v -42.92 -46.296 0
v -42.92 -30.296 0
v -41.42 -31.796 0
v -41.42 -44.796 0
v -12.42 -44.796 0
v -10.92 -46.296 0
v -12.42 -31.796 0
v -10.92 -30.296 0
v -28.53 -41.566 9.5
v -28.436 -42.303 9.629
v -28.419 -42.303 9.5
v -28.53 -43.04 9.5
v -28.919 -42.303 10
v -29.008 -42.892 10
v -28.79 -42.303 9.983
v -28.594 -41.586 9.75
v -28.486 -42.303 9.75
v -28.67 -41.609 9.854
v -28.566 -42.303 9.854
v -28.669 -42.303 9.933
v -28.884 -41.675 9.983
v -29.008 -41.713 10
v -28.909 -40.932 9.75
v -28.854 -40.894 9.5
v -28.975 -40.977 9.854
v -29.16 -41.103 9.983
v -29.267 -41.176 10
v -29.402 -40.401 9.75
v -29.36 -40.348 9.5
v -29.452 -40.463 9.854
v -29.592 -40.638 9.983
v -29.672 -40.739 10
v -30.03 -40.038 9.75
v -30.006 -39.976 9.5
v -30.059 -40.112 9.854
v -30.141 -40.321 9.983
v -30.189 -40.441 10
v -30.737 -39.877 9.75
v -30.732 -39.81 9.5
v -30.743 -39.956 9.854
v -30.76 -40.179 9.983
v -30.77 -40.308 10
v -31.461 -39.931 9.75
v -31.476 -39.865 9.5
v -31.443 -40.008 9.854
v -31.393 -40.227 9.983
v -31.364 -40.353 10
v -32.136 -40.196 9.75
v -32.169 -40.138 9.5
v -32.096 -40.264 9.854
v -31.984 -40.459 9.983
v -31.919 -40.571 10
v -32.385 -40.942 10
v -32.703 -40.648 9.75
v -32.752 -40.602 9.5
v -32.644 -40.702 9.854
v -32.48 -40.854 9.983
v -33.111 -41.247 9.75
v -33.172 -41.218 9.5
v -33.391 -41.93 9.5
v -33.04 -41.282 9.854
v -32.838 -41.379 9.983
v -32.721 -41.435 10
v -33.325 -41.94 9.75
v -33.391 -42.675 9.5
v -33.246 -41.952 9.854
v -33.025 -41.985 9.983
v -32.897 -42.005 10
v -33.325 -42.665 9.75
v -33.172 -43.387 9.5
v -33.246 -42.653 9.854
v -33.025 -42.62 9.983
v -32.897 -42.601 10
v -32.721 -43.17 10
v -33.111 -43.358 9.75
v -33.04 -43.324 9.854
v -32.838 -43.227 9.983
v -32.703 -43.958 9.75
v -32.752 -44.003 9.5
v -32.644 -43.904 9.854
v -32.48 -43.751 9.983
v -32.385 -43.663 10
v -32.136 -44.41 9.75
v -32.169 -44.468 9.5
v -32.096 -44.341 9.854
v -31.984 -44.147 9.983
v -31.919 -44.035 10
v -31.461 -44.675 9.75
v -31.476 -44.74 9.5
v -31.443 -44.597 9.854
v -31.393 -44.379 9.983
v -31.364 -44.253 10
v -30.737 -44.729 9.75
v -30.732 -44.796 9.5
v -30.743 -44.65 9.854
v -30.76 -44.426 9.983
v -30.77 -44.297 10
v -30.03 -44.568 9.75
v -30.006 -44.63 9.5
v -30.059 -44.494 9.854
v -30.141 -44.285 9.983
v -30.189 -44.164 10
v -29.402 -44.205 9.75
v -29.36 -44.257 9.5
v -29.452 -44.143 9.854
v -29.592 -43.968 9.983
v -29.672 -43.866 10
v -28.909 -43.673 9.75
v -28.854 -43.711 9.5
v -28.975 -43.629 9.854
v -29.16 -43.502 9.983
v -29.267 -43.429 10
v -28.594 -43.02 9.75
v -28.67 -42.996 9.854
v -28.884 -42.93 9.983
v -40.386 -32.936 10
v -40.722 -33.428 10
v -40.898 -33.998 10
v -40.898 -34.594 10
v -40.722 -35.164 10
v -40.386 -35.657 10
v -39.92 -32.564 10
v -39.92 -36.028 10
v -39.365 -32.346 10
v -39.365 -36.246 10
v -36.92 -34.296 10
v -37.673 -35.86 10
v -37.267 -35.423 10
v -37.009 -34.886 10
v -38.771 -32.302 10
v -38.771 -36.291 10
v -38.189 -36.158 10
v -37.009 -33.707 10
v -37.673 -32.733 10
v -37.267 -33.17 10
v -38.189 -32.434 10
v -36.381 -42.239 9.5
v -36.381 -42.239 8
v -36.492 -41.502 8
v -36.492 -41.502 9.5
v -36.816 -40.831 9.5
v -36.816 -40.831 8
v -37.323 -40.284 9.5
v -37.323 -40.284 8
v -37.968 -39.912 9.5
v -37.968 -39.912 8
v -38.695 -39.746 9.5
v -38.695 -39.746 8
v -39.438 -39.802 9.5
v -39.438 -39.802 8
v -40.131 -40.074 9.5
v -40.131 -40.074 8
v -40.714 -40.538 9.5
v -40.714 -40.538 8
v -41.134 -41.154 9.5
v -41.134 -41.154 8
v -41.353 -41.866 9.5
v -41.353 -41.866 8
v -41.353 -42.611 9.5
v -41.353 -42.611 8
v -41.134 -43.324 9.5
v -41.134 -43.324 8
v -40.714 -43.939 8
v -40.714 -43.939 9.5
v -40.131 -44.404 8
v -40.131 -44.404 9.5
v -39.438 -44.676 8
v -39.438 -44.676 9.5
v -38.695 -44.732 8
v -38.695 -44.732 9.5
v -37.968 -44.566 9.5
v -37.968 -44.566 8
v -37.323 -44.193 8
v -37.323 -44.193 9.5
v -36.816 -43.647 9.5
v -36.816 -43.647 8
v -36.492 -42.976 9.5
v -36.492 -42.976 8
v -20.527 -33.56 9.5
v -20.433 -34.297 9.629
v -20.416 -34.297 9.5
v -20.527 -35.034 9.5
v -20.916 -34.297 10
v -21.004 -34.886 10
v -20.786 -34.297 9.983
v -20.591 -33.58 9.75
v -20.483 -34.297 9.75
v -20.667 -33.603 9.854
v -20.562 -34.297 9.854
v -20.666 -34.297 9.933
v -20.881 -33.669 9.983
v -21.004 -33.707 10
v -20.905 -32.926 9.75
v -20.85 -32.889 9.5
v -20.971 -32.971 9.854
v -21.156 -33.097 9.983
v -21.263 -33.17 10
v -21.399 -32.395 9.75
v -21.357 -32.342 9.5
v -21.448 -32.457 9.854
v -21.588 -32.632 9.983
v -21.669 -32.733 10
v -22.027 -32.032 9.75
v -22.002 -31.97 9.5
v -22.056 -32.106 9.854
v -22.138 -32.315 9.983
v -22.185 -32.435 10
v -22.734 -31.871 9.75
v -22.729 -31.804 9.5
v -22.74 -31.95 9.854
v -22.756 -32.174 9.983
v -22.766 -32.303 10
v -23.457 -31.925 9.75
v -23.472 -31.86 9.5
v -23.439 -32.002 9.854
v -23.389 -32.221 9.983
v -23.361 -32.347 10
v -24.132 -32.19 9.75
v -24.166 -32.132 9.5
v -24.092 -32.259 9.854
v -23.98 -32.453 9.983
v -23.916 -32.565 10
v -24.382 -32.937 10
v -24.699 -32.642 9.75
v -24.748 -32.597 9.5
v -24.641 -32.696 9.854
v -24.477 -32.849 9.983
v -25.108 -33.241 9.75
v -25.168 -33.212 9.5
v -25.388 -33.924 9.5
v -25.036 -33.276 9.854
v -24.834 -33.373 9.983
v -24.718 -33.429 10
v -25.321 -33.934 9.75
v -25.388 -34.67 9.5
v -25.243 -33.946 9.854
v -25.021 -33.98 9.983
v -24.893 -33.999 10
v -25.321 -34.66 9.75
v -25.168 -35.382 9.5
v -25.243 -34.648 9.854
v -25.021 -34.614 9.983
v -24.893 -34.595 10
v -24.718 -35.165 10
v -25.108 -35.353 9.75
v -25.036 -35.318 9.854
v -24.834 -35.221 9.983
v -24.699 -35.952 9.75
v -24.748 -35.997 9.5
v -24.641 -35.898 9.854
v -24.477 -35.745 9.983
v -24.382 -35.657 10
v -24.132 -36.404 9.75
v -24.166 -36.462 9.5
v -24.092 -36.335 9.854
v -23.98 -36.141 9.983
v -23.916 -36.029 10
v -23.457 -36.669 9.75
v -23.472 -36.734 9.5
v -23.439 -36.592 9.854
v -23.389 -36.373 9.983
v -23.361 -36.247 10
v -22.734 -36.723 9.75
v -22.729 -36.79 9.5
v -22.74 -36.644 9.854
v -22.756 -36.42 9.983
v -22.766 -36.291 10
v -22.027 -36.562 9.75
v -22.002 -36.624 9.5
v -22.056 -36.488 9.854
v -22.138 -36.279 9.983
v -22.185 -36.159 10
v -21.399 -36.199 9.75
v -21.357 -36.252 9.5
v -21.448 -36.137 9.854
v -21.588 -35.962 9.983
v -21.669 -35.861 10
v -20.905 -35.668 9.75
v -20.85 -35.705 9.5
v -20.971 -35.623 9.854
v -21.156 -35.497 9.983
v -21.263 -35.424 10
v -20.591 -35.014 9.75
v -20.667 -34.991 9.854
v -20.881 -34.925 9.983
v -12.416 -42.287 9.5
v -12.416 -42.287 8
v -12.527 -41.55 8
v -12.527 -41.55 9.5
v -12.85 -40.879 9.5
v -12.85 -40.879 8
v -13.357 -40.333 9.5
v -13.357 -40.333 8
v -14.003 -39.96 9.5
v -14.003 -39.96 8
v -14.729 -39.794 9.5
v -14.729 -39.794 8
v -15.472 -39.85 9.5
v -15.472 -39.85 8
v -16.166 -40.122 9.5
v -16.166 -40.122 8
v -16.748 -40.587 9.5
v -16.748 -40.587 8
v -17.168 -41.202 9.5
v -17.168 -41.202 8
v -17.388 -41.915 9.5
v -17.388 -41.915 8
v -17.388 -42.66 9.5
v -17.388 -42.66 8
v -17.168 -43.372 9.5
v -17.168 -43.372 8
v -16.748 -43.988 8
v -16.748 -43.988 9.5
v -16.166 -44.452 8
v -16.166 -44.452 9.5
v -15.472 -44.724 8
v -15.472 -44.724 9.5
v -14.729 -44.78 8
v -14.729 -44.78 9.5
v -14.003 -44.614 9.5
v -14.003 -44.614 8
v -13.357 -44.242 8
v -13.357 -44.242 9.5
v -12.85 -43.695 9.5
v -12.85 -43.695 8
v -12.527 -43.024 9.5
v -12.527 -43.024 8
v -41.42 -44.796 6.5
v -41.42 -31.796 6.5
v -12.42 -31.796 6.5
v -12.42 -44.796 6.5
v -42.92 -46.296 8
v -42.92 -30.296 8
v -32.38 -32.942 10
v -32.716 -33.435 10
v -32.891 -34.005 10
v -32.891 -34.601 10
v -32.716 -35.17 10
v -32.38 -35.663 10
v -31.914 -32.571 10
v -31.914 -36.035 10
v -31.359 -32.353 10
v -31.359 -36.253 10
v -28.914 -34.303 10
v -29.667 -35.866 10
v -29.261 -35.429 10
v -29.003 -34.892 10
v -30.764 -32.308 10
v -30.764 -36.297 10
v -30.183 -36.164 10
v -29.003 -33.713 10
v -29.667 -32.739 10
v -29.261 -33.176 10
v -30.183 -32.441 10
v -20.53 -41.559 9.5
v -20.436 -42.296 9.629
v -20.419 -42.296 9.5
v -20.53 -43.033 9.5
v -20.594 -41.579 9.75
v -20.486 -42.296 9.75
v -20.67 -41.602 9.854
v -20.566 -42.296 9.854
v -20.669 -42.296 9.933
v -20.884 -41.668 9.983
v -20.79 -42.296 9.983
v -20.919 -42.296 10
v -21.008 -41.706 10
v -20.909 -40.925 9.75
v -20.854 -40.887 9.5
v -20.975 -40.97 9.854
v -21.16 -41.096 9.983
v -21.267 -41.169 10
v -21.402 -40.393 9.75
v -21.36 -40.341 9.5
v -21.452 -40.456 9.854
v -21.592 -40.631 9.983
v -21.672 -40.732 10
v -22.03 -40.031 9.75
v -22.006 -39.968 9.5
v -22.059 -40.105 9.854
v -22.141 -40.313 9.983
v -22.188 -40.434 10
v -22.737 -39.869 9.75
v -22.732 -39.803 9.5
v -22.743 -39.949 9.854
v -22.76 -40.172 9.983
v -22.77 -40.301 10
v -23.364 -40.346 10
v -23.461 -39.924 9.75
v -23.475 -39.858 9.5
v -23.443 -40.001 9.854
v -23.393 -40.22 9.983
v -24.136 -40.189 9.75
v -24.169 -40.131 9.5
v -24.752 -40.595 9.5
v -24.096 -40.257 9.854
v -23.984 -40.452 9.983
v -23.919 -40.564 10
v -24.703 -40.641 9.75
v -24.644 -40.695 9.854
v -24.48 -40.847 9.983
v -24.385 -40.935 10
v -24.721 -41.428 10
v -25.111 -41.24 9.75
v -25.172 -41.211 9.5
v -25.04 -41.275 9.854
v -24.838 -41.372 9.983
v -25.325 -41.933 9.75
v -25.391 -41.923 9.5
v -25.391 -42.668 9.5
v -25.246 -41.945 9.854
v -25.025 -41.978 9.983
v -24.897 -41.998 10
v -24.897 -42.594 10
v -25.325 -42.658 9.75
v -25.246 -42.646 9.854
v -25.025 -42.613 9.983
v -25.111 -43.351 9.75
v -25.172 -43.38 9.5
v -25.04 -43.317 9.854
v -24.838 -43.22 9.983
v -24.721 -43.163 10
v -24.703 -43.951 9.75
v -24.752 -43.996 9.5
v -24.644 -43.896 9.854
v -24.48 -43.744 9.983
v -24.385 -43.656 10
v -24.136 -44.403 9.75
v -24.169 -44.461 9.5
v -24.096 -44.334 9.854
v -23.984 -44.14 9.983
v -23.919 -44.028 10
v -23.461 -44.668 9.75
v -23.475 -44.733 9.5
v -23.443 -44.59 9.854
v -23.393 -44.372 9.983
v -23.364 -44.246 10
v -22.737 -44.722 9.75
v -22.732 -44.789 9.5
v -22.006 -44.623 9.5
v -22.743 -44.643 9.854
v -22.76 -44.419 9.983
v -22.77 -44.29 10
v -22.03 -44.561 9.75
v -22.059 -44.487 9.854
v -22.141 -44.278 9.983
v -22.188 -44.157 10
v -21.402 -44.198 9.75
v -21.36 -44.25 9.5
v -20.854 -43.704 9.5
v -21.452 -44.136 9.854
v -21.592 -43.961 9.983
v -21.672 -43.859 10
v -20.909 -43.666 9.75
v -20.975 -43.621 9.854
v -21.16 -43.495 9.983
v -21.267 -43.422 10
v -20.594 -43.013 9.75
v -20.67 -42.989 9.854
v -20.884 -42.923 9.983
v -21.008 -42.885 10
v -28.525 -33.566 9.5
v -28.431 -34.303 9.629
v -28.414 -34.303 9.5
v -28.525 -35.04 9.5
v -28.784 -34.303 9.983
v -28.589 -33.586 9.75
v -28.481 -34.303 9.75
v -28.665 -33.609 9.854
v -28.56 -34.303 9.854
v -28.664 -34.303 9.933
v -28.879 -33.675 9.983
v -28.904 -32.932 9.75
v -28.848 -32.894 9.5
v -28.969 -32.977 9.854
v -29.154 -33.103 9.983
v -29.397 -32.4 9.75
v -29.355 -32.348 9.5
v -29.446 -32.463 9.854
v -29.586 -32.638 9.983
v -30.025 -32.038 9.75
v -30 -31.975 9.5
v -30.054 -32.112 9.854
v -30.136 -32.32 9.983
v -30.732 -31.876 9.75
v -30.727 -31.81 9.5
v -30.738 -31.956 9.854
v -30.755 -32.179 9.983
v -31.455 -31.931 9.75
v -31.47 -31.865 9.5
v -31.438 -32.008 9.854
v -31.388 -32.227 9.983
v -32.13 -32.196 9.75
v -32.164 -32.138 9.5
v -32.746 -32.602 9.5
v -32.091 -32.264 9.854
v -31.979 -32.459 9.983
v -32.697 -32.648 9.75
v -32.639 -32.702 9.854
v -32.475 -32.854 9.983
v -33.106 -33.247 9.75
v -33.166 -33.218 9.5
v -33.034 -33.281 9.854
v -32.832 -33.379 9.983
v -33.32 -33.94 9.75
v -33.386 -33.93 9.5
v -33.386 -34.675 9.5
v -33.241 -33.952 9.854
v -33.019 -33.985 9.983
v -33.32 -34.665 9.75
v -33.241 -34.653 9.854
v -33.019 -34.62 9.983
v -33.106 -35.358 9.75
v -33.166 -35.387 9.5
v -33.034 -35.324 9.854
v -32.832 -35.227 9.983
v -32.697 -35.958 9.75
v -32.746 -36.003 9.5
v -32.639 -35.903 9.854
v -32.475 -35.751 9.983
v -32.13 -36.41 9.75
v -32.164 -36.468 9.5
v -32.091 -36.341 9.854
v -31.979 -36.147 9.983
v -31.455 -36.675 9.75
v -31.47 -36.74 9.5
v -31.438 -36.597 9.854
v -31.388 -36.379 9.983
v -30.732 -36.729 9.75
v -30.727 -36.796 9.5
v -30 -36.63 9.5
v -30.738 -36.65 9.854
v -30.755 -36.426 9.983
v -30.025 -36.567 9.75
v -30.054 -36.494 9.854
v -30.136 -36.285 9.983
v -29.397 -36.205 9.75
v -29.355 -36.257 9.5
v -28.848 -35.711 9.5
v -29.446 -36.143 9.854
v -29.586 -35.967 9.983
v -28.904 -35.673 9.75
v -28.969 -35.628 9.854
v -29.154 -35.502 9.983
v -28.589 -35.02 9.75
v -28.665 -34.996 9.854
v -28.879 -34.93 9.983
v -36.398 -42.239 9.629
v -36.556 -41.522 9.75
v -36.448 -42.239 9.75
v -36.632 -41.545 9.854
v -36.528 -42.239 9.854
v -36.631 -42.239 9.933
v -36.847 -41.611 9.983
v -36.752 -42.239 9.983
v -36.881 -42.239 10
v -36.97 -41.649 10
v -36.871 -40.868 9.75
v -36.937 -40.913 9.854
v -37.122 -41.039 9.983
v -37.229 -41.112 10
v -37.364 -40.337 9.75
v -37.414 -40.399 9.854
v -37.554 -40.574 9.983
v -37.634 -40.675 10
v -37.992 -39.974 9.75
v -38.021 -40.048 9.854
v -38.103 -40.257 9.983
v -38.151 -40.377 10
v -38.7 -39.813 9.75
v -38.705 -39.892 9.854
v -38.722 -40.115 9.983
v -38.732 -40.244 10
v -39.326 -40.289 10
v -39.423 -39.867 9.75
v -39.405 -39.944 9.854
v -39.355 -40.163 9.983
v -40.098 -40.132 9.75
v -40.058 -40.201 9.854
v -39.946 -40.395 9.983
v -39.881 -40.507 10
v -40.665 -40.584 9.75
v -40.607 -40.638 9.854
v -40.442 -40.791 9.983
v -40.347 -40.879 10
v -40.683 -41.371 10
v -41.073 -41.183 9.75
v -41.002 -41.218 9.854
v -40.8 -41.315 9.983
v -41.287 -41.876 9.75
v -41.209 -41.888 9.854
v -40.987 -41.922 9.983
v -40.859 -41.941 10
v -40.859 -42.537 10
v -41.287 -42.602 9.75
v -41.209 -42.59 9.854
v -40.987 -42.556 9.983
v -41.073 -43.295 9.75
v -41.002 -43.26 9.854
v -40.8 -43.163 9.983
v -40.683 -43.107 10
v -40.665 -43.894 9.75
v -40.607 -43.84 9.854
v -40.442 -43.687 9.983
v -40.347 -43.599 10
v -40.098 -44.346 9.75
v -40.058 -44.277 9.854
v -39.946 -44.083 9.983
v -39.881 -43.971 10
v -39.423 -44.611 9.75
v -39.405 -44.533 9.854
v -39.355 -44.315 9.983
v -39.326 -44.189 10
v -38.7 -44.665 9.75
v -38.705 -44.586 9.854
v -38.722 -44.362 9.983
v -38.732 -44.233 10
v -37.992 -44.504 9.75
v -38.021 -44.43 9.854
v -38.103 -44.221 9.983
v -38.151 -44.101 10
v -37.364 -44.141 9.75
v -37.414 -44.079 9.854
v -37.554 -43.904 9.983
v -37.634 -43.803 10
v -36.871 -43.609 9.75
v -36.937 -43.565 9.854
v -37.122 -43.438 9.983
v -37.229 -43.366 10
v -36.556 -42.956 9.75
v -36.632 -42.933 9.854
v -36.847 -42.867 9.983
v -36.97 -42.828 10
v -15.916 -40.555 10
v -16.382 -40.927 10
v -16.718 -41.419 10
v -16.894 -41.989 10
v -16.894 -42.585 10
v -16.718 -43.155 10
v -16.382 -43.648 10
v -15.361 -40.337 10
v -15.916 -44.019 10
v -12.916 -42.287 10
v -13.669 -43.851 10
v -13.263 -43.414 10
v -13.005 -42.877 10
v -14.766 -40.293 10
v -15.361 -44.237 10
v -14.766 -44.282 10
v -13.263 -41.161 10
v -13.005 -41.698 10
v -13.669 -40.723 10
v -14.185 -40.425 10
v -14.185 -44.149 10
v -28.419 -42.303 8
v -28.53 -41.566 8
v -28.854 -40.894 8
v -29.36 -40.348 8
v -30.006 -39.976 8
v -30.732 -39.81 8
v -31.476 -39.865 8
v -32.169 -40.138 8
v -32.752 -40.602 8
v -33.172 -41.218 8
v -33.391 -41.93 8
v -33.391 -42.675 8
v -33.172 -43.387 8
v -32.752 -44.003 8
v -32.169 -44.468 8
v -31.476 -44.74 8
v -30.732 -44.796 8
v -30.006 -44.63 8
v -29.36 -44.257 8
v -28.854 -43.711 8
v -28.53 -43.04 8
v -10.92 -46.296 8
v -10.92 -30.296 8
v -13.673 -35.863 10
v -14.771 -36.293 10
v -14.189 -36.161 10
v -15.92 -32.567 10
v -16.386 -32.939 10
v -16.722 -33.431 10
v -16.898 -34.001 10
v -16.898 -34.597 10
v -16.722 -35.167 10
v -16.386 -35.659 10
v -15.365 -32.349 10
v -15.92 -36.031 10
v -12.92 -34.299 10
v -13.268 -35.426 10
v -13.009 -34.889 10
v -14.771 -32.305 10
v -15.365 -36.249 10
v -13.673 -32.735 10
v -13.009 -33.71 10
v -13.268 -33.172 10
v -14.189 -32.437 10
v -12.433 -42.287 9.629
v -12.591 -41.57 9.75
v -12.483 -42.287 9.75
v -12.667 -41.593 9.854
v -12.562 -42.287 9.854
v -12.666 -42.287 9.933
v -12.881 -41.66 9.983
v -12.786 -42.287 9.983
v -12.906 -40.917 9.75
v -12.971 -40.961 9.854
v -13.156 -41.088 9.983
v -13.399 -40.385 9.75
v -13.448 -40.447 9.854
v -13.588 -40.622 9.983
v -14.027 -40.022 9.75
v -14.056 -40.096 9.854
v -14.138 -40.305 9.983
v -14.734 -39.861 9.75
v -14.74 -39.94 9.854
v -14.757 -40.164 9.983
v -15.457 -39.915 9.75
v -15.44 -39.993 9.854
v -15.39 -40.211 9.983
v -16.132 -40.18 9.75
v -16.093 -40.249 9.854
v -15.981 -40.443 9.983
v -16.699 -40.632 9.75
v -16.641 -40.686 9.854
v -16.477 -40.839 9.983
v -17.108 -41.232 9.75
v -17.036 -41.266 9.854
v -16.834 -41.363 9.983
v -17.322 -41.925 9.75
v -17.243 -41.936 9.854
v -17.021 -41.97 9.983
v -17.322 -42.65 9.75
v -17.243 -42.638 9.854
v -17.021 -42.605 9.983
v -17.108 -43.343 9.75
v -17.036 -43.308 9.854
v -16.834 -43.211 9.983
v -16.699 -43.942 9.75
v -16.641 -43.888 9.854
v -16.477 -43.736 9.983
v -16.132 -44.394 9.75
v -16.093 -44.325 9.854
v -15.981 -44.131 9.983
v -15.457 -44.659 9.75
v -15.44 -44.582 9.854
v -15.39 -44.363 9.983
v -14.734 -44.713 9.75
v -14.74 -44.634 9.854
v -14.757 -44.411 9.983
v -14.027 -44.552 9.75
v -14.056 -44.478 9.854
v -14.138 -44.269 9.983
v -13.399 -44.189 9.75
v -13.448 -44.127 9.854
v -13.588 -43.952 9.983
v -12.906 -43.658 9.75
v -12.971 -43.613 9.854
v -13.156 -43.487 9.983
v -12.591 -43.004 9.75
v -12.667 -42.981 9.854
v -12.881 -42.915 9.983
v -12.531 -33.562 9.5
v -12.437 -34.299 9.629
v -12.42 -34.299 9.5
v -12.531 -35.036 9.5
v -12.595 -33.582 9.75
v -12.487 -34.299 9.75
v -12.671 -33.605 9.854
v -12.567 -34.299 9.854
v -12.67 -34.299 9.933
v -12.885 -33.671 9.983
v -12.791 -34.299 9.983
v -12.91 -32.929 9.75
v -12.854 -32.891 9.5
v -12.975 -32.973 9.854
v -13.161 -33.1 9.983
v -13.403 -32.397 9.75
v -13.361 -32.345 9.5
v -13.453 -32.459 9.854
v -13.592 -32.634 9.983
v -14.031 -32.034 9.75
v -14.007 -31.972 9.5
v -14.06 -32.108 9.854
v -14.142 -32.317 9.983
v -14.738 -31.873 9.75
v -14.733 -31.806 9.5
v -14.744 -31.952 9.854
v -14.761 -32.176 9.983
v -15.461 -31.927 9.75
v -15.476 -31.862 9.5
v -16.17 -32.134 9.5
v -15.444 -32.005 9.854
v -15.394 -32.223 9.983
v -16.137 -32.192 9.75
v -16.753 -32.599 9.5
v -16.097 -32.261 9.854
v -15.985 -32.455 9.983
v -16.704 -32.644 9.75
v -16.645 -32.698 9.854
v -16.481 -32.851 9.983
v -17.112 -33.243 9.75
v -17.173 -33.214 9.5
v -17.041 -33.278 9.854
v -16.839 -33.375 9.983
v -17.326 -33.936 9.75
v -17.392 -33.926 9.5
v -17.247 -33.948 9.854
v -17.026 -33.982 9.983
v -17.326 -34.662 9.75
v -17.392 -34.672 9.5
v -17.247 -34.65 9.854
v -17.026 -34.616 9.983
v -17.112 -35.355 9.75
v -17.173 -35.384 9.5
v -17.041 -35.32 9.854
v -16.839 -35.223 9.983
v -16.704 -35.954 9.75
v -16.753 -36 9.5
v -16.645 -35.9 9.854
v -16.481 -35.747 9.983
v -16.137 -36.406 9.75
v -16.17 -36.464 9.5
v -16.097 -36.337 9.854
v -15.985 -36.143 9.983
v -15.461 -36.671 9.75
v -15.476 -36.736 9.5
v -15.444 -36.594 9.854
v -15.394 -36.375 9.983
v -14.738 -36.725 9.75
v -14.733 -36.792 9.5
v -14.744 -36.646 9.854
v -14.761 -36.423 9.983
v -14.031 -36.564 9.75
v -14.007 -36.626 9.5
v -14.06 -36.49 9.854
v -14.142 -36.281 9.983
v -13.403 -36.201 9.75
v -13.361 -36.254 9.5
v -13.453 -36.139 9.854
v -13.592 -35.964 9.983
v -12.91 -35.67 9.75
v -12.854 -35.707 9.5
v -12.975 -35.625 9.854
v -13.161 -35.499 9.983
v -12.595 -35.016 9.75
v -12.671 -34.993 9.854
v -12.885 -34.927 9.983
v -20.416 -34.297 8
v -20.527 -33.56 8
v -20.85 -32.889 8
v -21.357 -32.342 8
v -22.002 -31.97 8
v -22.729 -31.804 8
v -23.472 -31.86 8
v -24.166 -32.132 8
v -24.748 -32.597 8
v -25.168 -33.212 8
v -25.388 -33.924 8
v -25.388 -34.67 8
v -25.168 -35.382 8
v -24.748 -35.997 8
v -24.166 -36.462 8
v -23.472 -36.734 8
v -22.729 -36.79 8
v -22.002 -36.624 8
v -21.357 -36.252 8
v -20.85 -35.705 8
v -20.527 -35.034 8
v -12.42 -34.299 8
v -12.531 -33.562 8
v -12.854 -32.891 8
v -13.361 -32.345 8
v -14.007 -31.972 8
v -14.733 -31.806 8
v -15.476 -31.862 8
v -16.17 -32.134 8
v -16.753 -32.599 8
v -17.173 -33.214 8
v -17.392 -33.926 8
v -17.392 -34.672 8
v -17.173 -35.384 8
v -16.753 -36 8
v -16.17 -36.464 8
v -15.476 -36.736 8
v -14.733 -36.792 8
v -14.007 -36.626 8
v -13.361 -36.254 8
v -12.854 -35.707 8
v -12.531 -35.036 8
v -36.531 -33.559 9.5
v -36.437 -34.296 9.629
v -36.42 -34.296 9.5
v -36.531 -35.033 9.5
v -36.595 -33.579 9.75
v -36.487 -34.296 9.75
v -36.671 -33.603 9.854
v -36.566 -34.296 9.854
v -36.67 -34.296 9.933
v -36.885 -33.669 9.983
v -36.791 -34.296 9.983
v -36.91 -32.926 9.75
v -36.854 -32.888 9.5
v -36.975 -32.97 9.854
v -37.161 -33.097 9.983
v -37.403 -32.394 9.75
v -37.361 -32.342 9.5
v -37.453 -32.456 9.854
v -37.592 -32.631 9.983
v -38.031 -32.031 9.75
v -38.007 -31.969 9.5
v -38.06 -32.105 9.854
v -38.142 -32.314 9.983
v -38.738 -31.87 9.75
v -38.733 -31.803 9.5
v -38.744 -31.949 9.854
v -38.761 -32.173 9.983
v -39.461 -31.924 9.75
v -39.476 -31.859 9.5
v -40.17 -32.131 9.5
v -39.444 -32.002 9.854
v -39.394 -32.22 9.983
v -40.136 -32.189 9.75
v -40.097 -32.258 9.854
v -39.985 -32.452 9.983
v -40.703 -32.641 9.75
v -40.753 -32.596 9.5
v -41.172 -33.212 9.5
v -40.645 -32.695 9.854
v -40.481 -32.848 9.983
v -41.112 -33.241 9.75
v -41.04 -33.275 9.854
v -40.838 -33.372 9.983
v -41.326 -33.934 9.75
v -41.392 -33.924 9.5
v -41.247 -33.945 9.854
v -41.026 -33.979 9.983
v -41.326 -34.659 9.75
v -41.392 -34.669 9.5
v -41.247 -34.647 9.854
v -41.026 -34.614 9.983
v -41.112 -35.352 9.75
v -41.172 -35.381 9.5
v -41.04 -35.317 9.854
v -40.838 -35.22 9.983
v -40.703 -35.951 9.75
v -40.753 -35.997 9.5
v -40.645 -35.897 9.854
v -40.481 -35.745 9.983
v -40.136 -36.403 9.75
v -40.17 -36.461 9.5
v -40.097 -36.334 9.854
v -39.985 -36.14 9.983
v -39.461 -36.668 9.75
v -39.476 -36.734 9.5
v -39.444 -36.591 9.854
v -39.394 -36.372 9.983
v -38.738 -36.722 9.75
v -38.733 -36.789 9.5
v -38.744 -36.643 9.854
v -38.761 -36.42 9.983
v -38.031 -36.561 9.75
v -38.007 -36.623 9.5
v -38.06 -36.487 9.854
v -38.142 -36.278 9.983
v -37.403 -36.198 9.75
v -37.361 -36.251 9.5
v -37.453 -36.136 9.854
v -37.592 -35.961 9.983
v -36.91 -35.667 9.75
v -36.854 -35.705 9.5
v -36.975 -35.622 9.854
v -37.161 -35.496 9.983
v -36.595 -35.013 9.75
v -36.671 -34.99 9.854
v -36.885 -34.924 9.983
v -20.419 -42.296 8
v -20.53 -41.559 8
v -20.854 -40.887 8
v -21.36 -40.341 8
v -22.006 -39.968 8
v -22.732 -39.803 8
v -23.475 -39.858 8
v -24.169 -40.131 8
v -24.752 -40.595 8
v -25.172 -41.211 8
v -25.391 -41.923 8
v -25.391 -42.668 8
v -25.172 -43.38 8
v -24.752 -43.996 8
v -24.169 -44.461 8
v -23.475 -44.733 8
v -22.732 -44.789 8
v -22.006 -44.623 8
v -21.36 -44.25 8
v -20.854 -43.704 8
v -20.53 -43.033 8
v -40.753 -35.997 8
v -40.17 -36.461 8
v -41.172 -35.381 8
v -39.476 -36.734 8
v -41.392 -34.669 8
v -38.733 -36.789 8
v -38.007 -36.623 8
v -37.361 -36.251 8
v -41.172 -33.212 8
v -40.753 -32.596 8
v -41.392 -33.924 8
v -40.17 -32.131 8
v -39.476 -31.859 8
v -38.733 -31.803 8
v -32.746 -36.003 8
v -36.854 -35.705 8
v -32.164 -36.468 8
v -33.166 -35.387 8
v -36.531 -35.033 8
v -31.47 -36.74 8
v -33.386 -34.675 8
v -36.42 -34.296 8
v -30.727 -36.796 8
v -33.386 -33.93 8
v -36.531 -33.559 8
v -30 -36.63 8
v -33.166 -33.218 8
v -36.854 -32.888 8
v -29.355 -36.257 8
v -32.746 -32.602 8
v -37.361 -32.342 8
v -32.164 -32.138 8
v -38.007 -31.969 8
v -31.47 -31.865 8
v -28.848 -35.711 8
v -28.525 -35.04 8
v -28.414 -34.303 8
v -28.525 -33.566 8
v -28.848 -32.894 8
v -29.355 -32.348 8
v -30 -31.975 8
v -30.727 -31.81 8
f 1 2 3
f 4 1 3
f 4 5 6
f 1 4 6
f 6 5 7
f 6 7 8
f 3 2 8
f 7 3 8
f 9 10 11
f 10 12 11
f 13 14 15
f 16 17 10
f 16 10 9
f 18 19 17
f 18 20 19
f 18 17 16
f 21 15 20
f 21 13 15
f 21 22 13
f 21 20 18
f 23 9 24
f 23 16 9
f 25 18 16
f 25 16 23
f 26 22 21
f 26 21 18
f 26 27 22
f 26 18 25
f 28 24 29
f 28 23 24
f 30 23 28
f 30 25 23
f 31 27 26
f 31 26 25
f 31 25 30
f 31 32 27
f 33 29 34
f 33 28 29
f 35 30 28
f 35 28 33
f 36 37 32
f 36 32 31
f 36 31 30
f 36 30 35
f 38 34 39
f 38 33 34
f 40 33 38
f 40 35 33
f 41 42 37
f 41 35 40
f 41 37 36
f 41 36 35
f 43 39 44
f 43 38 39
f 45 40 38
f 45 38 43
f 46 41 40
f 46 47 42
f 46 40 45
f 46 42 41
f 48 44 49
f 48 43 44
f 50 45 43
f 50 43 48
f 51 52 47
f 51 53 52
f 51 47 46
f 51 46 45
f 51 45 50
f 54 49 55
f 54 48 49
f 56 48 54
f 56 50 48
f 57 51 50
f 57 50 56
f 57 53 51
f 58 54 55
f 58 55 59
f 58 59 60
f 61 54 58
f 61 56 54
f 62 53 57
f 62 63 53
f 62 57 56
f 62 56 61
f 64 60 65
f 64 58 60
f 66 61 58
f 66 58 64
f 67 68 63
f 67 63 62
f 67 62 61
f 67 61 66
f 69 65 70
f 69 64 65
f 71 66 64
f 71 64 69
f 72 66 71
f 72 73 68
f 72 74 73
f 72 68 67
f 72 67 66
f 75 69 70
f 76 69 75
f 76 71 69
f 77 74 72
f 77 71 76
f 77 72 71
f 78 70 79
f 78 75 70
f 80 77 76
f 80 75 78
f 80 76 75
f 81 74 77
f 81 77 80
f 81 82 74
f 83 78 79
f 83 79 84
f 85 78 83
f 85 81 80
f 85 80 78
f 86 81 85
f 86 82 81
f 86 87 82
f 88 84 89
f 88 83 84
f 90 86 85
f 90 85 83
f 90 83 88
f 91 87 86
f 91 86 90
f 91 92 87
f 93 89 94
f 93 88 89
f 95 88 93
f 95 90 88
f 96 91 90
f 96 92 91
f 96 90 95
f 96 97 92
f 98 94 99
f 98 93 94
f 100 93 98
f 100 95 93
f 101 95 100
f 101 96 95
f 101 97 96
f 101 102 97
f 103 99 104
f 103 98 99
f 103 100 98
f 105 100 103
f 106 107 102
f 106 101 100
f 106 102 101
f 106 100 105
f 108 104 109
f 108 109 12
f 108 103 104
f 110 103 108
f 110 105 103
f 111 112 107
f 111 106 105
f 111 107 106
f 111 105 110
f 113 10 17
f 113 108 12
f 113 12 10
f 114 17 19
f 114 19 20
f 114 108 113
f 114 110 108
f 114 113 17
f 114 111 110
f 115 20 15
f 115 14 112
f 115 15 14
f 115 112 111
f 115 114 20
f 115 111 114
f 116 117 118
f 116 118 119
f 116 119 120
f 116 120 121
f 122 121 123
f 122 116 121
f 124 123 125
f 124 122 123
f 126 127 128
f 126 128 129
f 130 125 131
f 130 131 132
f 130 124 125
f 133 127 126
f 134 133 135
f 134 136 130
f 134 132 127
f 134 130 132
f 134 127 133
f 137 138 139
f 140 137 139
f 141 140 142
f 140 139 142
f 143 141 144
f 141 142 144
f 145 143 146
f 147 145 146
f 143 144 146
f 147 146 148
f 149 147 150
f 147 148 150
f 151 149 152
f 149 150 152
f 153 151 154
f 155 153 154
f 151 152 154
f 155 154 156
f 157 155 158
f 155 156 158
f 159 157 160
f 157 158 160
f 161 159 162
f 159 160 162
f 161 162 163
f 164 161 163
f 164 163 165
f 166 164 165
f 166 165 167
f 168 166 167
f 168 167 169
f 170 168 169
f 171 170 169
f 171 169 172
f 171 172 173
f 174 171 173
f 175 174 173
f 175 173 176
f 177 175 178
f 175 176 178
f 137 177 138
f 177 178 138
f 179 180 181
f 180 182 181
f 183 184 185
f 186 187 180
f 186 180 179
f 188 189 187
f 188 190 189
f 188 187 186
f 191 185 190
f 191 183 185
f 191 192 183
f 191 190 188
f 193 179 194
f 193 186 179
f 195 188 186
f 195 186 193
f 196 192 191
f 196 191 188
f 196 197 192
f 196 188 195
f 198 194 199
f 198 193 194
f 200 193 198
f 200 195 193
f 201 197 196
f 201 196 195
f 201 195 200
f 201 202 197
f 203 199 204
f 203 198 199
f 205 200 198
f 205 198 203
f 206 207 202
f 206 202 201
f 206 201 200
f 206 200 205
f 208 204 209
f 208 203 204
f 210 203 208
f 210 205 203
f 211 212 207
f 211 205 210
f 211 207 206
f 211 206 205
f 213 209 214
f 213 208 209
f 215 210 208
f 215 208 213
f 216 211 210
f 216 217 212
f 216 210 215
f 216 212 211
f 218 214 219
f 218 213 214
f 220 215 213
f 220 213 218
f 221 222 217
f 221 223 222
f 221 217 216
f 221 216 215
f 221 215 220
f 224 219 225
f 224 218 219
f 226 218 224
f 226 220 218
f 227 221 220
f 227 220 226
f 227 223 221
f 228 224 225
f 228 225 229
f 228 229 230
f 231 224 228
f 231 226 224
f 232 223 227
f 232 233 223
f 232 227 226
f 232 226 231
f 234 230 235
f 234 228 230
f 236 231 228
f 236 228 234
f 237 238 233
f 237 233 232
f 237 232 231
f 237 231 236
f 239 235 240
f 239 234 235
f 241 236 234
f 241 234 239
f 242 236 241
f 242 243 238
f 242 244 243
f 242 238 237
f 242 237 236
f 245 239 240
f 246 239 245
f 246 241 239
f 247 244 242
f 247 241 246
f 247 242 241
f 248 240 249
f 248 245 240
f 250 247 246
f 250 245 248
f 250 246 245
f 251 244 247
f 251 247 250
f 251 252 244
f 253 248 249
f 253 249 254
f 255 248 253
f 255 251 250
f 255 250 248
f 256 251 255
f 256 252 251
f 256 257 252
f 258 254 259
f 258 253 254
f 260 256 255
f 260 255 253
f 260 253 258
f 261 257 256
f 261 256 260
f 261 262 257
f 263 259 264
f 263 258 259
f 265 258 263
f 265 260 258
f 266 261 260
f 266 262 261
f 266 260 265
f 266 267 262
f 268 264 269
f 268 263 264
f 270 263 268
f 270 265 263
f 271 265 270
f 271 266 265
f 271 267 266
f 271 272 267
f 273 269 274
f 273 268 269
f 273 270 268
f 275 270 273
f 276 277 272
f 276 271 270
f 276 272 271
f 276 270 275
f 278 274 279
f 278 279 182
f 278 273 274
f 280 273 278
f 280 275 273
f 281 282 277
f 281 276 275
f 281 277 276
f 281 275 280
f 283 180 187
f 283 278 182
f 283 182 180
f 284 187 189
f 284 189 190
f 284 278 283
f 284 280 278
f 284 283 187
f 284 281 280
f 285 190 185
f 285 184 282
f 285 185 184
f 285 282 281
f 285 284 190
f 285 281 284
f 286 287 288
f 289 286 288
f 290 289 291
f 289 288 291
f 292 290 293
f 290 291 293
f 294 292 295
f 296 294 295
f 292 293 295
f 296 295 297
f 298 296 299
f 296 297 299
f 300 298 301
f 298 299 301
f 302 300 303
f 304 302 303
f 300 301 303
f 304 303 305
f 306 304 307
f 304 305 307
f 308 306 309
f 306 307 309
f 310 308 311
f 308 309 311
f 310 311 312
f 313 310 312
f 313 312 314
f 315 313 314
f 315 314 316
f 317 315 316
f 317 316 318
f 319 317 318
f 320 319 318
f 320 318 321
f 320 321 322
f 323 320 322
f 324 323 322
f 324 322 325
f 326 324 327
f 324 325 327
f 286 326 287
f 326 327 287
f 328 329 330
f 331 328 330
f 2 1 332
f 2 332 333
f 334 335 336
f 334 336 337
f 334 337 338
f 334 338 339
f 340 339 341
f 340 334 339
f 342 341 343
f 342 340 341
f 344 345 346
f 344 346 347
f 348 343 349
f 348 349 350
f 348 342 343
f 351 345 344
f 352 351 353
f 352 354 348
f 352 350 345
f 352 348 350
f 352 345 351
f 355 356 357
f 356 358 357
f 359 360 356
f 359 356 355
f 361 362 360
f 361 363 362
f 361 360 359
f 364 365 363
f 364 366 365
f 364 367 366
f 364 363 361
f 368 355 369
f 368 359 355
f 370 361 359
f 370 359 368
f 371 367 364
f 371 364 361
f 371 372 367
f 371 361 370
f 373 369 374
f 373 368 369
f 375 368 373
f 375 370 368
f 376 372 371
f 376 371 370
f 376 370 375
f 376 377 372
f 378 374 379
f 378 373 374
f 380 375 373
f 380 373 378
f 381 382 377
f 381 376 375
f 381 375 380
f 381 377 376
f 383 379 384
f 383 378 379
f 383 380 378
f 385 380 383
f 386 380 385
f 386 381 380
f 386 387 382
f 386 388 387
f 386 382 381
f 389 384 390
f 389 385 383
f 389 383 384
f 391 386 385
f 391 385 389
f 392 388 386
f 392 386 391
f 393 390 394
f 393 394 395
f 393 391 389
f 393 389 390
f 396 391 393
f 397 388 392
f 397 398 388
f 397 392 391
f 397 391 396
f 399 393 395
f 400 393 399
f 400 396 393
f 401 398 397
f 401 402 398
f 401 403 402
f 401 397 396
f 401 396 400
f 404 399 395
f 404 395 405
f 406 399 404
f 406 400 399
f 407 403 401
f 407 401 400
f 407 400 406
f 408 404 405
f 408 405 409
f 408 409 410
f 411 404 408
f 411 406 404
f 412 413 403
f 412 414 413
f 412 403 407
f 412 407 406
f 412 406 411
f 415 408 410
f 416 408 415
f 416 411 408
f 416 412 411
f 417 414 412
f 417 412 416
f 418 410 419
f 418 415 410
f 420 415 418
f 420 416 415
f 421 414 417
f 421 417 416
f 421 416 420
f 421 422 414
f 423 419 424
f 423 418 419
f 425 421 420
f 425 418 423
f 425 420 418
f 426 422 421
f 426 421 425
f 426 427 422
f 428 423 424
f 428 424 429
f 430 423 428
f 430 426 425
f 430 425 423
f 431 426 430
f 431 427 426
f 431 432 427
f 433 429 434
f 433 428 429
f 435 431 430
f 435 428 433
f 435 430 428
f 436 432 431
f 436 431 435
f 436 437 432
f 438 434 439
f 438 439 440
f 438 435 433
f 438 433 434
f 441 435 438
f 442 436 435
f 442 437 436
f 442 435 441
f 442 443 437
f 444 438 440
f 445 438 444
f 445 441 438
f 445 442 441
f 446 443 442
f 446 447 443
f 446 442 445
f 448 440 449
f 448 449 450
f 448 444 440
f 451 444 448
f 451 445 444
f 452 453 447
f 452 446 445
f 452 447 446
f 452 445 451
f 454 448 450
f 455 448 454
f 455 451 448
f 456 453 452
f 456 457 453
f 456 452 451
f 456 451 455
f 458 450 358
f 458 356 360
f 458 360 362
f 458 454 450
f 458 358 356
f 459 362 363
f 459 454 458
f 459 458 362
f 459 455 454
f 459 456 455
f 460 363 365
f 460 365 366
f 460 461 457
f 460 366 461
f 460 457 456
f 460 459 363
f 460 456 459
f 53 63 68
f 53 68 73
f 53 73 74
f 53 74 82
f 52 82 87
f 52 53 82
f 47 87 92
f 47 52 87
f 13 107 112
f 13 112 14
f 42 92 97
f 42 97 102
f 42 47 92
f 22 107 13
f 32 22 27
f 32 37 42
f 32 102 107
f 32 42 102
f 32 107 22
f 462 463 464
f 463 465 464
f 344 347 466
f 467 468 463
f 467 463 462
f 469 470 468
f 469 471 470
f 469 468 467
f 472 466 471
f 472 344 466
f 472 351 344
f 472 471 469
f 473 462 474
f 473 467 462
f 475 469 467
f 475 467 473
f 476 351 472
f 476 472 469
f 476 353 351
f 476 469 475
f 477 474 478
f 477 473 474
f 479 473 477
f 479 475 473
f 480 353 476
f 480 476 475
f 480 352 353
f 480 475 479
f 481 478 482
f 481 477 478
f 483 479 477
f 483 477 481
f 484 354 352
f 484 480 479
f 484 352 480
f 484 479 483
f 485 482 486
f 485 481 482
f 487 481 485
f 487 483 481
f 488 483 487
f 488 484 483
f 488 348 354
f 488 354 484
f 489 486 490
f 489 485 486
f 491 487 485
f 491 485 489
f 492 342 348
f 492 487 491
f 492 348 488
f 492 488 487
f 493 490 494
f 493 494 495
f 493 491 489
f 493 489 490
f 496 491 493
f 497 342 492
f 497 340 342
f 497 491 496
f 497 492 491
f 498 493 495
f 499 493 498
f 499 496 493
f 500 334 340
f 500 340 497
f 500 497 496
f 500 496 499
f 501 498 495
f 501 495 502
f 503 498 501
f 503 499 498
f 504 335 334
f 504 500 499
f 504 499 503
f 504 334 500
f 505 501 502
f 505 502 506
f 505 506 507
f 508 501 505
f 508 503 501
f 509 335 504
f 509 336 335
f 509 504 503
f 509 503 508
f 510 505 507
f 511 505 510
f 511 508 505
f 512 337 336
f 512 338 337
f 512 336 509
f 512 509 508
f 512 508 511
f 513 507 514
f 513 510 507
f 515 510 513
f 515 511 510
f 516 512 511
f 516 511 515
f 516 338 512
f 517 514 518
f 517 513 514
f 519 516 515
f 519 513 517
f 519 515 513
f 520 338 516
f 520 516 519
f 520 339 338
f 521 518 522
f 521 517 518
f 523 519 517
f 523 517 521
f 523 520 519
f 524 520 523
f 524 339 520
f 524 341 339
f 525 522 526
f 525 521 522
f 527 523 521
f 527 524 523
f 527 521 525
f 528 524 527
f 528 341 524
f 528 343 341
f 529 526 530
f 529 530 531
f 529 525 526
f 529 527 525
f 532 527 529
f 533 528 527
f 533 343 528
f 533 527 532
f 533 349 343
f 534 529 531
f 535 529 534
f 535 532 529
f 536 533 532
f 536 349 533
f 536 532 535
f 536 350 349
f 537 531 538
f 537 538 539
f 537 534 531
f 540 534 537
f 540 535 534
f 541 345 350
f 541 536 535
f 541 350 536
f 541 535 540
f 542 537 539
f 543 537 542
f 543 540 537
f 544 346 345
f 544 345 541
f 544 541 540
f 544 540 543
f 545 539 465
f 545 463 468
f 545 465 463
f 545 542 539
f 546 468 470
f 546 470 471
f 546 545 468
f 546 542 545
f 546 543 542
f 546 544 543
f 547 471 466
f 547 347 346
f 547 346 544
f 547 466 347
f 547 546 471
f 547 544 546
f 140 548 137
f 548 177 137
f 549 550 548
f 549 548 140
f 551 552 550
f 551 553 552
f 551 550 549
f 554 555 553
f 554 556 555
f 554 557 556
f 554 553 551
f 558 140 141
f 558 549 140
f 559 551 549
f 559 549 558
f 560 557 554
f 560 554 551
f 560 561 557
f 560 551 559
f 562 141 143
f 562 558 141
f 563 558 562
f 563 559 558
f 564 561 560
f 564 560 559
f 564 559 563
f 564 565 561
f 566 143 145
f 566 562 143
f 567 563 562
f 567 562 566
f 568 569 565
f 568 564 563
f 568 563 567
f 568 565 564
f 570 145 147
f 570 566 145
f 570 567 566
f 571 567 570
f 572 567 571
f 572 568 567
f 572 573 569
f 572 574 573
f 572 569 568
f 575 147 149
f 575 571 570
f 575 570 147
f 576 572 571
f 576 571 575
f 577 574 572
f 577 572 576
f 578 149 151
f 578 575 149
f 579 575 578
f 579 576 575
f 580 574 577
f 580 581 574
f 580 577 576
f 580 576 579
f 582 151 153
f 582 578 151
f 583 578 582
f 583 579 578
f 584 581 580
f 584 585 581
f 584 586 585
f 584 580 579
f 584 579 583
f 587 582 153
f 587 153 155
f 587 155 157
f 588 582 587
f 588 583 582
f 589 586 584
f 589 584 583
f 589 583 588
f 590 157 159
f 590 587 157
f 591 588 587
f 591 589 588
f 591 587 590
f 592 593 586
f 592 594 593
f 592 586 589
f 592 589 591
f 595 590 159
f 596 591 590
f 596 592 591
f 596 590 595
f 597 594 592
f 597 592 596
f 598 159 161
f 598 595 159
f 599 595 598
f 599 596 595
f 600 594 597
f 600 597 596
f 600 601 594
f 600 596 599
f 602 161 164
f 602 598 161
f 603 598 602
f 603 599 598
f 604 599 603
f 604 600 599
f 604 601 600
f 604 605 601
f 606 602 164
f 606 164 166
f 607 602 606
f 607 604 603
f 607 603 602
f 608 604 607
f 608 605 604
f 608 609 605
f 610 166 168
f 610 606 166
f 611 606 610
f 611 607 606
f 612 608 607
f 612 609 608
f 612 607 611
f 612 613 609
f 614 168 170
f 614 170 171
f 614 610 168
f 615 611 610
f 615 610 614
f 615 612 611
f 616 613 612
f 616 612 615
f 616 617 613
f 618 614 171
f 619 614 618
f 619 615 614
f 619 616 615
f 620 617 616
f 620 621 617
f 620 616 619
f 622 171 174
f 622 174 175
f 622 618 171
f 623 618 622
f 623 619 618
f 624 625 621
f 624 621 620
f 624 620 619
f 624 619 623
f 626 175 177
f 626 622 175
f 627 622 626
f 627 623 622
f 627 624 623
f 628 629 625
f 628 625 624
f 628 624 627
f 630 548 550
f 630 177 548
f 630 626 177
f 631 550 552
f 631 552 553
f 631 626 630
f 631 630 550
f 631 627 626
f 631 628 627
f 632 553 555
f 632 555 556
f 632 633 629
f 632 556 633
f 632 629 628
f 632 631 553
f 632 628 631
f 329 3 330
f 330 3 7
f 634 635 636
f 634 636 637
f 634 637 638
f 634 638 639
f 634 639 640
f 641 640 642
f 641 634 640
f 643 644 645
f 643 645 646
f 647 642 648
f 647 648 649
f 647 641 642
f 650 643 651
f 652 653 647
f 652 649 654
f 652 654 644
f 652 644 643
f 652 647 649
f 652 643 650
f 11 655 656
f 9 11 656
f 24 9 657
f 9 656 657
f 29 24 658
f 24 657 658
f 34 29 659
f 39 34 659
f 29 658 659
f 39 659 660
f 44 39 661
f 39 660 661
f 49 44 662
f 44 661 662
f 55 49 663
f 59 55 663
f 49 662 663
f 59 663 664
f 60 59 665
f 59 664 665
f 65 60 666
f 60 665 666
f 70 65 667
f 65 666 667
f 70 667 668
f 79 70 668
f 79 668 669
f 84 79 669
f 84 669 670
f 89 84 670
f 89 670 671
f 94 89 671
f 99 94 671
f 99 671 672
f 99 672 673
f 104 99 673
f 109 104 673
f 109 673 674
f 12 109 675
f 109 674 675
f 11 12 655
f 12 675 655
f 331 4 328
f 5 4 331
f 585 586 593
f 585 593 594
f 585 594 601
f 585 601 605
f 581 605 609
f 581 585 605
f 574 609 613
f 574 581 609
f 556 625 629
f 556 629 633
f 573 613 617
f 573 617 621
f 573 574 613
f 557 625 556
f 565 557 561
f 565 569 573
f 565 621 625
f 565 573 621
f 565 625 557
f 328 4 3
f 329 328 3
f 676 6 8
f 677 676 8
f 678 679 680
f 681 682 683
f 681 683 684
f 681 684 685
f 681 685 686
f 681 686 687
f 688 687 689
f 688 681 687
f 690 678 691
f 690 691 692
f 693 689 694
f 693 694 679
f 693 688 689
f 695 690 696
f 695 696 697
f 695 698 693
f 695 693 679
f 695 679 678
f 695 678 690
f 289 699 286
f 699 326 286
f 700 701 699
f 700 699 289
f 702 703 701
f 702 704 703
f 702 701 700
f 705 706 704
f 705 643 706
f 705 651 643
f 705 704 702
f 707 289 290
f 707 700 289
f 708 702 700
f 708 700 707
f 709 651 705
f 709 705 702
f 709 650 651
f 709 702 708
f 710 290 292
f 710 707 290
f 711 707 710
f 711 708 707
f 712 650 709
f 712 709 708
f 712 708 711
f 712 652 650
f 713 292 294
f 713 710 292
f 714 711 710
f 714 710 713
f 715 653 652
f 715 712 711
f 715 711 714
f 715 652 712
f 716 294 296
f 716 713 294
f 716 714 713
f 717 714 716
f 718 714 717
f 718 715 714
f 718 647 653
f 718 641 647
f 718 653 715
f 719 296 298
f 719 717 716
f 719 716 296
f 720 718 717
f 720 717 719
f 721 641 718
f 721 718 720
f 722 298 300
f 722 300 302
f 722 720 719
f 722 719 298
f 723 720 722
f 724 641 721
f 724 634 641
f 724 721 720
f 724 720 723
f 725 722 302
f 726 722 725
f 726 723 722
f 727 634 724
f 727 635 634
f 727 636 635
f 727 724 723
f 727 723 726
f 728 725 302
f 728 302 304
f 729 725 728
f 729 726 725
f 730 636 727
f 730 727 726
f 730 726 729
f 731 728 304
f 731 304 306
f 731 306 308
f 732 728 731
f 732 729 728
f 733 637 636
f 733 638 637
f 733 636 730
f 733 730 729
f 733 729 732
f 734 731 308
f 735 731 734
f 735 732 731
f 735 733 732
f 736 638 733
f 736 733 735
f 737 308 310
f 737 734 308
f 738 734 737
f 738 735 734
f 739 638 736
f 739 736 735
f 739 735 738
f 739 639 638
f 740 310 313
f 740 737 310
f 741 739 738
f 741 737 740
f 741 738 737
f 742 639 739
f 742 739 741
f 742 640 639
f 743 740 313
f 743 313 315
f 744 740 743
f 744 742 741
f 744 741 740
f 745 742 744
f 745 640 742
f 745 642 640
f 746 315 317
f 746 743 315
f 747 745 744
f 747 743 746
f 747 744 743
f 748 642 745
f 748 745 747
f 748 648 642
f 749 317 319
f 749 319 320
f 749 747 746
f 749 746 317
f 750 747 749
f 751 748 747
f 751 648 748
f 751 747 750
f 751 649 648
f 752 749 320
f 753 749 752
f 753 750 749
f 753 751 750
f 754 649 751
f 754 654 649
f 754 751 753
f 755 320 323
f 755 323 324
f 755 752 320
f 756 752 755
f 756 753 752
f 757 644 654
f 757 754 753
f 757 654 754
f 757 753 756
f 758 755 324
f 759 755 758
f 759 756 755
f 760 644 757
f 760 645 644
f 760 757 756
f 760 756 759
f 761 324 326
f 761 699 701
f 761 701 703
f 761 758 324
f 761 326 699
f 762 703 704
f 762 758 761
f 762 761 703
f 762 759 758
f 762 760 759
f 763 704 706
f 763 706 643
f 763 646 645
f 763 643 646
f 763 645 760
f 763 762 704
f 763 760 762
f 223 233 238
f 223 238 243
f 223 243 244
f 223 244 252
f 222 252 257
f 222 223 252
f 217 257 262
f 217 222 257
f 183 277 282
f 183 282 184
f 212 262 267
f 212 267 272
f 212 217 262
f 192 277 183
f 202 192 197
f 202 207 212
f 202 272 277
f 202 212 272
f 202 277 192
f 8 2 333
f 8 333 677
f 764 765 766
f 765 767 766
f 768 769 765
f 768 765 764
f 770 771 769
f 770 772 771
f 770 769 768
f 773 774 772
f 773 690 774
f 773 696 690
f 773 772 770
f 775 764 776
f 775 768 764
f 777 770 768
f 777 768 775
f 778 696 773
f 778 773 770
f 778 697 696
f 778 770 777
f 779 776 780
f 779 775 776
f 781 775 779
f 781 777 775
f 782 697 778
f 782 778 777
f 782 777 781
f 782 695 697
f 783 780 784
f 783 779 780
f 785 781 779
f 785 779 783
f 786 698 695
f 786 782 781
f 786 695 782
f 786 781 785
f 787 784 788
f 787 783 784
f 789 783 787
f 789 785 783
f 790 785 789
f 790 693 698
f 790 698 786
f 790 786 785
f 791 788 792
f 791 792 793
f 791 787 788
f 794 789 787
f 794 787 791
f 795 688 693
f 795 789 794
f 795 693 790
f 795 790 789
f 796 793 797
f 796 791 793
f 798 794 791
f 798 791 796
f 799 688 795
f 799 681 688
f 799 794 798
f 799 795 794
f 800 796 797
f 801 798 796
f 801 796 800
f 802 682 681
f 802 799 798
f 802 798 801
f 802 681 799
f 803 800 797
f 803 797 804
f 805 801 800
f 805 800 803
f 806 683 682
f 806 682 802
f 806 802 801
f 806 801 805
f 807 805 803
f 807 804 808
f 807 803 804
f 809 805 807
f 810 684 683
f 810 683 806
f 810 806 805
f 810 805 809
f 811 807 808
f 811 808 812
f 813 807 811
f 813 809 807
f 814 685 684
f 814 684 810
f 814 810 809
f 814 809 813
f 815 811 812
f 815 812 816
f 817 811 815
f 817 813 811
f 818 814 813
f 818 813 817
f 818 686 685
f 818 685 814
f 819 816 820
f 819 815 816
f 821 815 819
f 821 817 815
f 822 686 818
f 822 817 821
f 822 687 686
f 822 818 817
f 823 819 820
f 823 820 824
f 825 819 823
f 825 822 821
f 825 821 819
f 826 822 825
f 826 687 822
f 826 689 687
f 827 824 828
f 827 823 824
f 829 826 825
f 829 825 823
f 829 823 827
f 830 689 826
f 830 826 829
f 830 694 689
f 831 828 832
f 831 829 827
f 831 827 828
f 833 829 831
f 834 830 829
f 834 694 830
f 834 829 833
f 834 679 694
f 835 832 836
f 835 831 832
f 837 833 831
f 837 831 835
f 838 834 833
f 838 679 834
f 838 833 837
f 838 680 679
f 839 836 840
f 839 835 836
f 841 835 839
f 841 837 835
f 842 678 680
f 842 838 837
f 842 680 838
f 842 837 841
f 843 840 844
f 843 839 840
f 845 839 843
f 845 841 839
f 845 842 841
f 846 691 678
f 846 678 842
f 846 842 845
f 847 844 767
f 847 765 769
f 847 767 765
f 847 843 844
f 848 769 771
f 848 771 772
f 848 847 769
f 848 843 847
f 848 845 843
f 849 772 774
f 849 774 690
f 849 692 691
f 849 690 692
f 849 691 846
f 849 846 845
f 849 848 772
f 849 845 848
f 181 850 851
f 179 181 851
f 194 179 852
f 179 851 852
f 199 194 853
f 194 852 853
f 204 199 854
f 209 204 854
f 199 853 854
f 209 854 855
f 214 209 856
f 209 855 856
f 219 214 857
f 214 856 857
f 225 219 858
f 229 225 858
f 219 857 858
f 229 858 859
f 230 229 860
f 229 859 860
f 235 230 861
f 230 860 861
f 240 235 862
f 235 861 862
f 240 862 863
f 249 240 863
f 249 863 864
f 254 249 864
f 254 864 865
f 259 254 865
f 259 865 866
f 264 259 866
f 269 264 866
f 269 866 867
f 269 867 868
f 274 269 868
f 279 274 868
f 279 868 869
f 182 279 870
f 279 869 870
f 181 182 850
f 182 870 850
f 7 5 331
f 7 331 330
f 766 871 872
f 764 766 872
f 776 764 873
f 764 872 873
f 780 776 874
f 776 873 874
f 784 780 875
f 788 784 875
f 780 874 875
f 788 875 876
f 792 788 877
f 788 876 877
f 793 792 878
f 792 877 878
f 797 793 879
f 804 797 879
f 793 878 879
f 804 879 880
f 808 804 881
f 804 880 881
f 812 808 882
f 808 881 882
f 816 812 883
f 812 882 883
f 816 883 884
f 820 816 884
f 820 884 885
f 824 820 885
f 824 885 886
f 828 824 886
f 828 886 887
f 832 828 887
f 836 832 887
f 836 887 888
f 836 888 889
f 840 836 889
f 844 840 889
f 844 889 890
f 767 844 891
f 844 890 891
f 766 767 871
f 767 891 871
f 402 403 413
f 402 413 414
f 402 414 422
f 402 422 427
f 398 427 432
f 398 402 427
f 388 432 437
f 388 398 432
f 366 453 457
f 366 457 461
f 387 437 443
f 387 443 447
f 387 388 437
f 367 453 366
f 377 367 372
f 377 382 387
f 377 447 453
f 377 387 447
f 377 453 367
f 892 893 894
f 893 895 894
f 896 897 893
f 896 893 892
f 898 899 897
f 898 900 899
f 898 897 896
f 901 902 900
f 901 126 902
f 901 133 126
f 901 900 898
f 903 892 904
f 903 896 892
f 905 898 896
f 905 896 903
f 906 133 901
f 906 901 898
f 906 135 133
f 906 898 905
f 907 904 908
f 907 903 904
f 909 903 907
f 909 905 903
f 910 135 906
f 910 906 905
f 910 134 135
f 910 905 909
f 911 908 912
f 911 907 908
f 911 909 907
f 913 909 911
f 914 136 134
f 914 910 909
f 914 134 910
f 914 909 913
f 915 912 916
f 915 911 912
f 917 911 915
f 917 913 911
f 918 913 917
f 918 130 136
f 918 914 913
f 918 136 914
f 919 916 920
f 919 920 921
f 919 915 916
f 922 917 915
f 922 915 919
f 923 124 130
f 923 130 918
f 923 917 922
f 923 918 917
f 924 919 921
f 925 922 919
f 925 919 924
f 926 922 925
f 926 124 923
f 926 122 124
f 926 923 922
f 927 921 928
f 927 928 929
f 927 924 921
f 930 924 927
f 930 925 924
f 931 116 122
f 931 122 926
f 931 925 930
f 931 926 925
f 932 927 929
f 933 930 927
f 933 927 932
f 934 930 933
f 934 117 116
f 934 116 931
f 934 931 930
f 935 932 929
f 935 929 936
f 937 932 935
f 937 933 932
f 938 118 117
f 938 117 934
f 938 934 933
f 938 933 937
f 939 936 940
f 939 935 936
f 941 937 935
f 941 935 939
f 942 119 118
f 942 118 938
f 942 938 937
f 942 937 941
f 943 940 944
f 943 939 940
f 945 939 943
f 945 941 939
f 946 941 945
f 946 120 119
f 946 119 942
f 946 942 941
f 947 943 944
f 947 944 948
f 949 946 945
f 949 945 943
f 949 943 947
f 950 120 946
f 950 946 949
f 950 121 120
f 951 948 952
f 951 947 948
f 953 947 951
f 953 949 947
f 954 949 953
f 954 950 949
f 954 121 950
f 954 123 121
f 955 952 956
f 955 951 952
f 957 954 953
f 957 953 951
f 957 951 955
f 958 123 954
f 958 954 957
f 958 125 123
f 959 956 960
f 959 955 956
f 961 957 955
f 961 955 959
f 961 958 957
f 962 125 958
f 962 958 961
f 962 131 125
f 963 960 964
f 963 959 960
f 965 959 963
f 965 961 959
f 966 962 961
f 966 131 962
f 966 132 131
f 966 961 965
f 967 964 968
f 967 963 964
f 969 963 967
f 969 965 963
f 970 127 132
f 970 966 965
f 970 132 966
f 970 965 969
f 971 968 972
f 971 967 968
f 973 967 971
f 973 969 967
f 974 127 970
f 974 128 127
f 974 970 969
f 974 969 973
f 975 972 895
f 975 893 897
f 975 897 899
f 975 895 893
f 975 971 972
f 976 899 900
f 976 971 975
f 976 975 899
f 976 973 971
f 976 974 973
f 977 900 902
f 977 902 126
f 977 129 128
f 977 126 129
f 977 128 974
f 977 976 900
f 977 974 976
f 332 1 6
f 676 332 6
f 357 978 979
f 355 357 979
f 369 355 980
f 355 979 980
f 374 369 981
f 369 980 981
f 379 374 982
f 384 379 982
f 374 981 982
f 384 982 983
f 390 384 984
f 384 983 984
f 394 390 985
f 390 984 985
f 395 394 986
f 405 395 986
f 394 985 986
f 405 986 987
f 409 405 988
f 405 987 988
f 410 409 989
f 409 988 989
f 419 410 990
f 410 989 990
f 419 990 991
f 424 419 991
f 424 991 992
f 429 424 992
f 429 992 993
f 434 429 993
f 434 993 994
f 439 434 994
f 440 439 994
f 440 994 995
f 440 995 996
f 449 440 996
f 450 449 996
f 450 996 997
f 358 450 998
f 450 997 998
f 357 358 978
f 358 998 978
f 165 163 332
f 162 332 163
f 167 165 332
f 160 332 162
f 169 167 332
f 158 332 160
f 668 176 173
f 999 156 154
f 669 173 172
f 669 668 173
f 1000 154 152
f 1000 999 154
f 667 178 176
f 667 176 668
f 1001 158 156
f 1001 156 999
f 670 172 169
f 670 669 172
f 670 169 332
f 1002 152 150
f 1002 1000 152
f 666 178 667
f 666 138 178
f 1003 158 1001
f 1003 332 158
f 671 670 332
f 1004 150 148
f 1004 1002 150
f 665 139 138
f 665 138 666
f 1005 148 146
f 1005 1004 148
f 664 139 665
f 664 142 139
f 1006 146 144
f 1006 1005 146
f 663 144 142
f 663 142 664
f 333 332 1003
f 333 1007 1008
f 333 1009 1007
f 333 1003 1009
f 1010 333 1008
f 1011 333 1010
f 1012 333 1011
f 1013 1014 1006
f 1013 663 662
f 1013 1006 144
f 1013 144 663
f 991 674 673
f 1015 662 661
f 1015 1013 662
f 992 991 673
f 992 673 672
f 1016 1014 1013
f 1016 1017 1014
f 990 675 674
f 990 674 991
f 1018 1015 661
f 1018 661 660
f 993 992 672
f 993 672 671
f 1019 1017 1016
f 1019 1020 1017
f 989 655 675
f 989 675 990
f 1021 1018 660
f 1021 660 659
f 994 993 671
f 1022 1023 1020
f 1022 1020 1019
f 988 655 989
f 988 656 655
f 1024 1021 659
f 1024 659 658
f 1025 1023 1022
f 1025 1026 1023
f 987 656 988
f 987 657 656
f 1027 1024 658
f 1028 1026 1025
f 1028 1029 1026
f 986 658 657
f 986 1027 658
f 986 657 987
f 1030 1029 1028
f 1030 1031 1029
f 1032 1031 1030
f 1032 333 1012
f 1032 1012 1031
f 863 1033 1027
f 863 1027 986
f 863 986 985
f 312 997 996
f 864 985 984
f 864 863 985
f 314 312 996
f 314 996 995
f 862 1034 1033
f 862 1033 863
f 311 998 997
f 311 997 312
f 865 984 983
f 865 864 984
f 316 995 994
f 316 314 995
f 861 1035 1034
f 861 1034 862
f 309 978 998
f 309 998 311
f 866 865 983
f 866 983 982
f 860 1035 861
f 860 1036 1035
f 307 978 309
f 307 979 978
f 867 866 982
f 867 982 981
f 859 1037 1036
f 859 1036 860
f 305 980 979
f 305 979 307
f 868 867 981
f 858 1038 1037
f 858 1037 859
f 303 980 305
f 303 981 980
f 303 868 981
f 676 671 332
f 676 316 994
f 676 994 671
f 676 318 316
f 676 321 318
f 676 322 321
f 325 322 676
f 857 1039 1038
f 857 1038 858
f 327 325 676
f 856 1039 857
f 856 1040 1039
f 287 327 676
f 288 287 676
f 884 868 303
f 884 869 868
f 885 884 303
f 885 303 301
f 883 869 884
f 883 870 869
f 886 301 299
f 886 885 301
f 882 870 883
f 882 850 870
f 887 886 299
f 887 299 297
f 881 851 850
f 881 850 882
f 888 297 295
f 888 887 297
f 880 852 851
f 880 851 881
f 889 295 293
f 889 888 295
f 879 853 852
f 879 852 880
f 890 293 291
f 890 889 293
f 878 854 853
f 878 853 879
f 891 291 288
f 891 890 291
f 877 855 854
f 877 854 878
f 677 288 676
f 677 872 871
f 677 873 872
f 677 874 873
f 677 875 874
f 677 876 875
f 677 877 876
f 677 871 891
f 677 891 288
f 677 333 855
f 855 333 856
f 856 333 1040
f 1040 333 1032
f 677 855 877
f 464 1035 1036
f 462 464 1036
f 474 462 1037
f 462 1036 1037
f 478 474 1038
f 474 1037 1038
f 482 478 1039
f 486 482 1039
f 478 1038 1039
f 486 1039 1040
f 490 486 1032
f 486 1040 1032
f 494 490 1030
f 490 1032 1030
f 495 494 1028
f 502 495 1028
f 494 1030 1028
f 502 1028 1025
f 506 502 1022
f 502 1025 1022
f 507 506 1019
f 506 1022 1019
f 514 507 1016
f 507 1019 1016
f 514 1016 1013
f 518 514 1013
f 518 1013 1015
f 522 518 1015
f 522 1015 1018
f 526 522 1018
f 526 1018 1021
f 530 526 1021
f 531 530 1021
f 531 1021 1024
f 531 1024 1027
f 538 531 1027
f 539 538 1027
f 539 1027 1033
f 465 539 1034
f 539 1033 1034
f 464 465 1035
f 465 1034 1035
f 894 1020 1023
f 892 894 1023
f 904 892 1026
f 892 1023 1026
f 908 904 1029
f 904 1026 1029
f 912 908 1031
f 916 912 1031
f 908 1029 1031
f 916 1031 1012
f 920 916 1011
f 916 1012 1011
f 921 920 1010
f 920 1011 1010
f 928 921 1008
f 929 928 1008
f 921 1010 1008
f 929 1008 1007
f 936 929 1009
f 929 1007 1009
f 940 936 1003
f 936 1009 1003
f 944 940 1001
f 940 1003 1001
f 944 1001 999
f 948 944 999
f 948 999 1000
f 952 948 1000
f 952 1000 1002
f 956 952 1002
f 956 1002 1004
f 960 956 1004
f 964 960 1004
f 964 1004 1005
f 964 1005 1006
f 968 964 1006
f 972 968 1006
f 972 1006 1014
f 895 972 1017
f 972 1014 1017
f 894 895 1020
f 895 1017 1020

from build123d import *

# Parameters (mm, degrees)
F0_W     = 32
F0_H     = 16
F1_DEPTH = 8
F3_T     = -1.5
F4_R     = 2.5
F5_DEPTH = 2
F6_R     = 0.5


with BuildPart() as f1:
    # F0 (on Top) → F1 (new body)
    with BuildSketch(Plane.XY):
        with Locations((-26.919962, -38.296238)):
            Rectangle(F0_W, F0_H)
    extrude(amount=F1_DEPTH)

    # F3
    f3_openings = [f1.faces().sort_by_distance(p)[0] for p in [
        (-26.919962, -38.296238, 0),
    ]]
    offset(amount=F3_T, openings=f3_openings)

    # F4 (on face) → F5 (join)
    with BuildSketch(Plane.XY.offset(8)):
        with Locations((-38.881334, -42.23888)):
            Circle(F4_R)
        with Locations((-30.919198, -42.302713)):
            Circle(F4_R)
        with Locations((-22.919174, -42.295676)):
            Circle(F4_R)
        with Locations((-14.915855, -42.28716)):
            Circle(F4_R)
        with Locations((-38.919962, -34.296238)):
            Circle(F4_R)
        with Locations((-30.91382, -34.302659)):
            Circle(F4_R)
        with Locations((-22.915579, -34.296975)):
            Circle(F4_R)
        with Locations((-14.920096, -34.299079)):
            Circle(F4_R)
    extrude(amount=F5_DEPTH)

    # F6
    f6_edges = [f1.edges().sort_by_distance(p)[0] for p in [
        (-41.381334, -42.23888, 10),
        (-41.419962, -34.296238, 10),
        (-33.419198, -42.302713, 10),
        (-33.41382, -34.302659, 10),
        (-25.419174, -42.295676, 10),
        (-25.415579, -34.296975, 10),
        (-17.415855, -42.28716, 10),
        (-17.420096, -34.299079, 10),
    ]]
    fillet(f6_edges, radius=F6_R)


solid = f1.part
